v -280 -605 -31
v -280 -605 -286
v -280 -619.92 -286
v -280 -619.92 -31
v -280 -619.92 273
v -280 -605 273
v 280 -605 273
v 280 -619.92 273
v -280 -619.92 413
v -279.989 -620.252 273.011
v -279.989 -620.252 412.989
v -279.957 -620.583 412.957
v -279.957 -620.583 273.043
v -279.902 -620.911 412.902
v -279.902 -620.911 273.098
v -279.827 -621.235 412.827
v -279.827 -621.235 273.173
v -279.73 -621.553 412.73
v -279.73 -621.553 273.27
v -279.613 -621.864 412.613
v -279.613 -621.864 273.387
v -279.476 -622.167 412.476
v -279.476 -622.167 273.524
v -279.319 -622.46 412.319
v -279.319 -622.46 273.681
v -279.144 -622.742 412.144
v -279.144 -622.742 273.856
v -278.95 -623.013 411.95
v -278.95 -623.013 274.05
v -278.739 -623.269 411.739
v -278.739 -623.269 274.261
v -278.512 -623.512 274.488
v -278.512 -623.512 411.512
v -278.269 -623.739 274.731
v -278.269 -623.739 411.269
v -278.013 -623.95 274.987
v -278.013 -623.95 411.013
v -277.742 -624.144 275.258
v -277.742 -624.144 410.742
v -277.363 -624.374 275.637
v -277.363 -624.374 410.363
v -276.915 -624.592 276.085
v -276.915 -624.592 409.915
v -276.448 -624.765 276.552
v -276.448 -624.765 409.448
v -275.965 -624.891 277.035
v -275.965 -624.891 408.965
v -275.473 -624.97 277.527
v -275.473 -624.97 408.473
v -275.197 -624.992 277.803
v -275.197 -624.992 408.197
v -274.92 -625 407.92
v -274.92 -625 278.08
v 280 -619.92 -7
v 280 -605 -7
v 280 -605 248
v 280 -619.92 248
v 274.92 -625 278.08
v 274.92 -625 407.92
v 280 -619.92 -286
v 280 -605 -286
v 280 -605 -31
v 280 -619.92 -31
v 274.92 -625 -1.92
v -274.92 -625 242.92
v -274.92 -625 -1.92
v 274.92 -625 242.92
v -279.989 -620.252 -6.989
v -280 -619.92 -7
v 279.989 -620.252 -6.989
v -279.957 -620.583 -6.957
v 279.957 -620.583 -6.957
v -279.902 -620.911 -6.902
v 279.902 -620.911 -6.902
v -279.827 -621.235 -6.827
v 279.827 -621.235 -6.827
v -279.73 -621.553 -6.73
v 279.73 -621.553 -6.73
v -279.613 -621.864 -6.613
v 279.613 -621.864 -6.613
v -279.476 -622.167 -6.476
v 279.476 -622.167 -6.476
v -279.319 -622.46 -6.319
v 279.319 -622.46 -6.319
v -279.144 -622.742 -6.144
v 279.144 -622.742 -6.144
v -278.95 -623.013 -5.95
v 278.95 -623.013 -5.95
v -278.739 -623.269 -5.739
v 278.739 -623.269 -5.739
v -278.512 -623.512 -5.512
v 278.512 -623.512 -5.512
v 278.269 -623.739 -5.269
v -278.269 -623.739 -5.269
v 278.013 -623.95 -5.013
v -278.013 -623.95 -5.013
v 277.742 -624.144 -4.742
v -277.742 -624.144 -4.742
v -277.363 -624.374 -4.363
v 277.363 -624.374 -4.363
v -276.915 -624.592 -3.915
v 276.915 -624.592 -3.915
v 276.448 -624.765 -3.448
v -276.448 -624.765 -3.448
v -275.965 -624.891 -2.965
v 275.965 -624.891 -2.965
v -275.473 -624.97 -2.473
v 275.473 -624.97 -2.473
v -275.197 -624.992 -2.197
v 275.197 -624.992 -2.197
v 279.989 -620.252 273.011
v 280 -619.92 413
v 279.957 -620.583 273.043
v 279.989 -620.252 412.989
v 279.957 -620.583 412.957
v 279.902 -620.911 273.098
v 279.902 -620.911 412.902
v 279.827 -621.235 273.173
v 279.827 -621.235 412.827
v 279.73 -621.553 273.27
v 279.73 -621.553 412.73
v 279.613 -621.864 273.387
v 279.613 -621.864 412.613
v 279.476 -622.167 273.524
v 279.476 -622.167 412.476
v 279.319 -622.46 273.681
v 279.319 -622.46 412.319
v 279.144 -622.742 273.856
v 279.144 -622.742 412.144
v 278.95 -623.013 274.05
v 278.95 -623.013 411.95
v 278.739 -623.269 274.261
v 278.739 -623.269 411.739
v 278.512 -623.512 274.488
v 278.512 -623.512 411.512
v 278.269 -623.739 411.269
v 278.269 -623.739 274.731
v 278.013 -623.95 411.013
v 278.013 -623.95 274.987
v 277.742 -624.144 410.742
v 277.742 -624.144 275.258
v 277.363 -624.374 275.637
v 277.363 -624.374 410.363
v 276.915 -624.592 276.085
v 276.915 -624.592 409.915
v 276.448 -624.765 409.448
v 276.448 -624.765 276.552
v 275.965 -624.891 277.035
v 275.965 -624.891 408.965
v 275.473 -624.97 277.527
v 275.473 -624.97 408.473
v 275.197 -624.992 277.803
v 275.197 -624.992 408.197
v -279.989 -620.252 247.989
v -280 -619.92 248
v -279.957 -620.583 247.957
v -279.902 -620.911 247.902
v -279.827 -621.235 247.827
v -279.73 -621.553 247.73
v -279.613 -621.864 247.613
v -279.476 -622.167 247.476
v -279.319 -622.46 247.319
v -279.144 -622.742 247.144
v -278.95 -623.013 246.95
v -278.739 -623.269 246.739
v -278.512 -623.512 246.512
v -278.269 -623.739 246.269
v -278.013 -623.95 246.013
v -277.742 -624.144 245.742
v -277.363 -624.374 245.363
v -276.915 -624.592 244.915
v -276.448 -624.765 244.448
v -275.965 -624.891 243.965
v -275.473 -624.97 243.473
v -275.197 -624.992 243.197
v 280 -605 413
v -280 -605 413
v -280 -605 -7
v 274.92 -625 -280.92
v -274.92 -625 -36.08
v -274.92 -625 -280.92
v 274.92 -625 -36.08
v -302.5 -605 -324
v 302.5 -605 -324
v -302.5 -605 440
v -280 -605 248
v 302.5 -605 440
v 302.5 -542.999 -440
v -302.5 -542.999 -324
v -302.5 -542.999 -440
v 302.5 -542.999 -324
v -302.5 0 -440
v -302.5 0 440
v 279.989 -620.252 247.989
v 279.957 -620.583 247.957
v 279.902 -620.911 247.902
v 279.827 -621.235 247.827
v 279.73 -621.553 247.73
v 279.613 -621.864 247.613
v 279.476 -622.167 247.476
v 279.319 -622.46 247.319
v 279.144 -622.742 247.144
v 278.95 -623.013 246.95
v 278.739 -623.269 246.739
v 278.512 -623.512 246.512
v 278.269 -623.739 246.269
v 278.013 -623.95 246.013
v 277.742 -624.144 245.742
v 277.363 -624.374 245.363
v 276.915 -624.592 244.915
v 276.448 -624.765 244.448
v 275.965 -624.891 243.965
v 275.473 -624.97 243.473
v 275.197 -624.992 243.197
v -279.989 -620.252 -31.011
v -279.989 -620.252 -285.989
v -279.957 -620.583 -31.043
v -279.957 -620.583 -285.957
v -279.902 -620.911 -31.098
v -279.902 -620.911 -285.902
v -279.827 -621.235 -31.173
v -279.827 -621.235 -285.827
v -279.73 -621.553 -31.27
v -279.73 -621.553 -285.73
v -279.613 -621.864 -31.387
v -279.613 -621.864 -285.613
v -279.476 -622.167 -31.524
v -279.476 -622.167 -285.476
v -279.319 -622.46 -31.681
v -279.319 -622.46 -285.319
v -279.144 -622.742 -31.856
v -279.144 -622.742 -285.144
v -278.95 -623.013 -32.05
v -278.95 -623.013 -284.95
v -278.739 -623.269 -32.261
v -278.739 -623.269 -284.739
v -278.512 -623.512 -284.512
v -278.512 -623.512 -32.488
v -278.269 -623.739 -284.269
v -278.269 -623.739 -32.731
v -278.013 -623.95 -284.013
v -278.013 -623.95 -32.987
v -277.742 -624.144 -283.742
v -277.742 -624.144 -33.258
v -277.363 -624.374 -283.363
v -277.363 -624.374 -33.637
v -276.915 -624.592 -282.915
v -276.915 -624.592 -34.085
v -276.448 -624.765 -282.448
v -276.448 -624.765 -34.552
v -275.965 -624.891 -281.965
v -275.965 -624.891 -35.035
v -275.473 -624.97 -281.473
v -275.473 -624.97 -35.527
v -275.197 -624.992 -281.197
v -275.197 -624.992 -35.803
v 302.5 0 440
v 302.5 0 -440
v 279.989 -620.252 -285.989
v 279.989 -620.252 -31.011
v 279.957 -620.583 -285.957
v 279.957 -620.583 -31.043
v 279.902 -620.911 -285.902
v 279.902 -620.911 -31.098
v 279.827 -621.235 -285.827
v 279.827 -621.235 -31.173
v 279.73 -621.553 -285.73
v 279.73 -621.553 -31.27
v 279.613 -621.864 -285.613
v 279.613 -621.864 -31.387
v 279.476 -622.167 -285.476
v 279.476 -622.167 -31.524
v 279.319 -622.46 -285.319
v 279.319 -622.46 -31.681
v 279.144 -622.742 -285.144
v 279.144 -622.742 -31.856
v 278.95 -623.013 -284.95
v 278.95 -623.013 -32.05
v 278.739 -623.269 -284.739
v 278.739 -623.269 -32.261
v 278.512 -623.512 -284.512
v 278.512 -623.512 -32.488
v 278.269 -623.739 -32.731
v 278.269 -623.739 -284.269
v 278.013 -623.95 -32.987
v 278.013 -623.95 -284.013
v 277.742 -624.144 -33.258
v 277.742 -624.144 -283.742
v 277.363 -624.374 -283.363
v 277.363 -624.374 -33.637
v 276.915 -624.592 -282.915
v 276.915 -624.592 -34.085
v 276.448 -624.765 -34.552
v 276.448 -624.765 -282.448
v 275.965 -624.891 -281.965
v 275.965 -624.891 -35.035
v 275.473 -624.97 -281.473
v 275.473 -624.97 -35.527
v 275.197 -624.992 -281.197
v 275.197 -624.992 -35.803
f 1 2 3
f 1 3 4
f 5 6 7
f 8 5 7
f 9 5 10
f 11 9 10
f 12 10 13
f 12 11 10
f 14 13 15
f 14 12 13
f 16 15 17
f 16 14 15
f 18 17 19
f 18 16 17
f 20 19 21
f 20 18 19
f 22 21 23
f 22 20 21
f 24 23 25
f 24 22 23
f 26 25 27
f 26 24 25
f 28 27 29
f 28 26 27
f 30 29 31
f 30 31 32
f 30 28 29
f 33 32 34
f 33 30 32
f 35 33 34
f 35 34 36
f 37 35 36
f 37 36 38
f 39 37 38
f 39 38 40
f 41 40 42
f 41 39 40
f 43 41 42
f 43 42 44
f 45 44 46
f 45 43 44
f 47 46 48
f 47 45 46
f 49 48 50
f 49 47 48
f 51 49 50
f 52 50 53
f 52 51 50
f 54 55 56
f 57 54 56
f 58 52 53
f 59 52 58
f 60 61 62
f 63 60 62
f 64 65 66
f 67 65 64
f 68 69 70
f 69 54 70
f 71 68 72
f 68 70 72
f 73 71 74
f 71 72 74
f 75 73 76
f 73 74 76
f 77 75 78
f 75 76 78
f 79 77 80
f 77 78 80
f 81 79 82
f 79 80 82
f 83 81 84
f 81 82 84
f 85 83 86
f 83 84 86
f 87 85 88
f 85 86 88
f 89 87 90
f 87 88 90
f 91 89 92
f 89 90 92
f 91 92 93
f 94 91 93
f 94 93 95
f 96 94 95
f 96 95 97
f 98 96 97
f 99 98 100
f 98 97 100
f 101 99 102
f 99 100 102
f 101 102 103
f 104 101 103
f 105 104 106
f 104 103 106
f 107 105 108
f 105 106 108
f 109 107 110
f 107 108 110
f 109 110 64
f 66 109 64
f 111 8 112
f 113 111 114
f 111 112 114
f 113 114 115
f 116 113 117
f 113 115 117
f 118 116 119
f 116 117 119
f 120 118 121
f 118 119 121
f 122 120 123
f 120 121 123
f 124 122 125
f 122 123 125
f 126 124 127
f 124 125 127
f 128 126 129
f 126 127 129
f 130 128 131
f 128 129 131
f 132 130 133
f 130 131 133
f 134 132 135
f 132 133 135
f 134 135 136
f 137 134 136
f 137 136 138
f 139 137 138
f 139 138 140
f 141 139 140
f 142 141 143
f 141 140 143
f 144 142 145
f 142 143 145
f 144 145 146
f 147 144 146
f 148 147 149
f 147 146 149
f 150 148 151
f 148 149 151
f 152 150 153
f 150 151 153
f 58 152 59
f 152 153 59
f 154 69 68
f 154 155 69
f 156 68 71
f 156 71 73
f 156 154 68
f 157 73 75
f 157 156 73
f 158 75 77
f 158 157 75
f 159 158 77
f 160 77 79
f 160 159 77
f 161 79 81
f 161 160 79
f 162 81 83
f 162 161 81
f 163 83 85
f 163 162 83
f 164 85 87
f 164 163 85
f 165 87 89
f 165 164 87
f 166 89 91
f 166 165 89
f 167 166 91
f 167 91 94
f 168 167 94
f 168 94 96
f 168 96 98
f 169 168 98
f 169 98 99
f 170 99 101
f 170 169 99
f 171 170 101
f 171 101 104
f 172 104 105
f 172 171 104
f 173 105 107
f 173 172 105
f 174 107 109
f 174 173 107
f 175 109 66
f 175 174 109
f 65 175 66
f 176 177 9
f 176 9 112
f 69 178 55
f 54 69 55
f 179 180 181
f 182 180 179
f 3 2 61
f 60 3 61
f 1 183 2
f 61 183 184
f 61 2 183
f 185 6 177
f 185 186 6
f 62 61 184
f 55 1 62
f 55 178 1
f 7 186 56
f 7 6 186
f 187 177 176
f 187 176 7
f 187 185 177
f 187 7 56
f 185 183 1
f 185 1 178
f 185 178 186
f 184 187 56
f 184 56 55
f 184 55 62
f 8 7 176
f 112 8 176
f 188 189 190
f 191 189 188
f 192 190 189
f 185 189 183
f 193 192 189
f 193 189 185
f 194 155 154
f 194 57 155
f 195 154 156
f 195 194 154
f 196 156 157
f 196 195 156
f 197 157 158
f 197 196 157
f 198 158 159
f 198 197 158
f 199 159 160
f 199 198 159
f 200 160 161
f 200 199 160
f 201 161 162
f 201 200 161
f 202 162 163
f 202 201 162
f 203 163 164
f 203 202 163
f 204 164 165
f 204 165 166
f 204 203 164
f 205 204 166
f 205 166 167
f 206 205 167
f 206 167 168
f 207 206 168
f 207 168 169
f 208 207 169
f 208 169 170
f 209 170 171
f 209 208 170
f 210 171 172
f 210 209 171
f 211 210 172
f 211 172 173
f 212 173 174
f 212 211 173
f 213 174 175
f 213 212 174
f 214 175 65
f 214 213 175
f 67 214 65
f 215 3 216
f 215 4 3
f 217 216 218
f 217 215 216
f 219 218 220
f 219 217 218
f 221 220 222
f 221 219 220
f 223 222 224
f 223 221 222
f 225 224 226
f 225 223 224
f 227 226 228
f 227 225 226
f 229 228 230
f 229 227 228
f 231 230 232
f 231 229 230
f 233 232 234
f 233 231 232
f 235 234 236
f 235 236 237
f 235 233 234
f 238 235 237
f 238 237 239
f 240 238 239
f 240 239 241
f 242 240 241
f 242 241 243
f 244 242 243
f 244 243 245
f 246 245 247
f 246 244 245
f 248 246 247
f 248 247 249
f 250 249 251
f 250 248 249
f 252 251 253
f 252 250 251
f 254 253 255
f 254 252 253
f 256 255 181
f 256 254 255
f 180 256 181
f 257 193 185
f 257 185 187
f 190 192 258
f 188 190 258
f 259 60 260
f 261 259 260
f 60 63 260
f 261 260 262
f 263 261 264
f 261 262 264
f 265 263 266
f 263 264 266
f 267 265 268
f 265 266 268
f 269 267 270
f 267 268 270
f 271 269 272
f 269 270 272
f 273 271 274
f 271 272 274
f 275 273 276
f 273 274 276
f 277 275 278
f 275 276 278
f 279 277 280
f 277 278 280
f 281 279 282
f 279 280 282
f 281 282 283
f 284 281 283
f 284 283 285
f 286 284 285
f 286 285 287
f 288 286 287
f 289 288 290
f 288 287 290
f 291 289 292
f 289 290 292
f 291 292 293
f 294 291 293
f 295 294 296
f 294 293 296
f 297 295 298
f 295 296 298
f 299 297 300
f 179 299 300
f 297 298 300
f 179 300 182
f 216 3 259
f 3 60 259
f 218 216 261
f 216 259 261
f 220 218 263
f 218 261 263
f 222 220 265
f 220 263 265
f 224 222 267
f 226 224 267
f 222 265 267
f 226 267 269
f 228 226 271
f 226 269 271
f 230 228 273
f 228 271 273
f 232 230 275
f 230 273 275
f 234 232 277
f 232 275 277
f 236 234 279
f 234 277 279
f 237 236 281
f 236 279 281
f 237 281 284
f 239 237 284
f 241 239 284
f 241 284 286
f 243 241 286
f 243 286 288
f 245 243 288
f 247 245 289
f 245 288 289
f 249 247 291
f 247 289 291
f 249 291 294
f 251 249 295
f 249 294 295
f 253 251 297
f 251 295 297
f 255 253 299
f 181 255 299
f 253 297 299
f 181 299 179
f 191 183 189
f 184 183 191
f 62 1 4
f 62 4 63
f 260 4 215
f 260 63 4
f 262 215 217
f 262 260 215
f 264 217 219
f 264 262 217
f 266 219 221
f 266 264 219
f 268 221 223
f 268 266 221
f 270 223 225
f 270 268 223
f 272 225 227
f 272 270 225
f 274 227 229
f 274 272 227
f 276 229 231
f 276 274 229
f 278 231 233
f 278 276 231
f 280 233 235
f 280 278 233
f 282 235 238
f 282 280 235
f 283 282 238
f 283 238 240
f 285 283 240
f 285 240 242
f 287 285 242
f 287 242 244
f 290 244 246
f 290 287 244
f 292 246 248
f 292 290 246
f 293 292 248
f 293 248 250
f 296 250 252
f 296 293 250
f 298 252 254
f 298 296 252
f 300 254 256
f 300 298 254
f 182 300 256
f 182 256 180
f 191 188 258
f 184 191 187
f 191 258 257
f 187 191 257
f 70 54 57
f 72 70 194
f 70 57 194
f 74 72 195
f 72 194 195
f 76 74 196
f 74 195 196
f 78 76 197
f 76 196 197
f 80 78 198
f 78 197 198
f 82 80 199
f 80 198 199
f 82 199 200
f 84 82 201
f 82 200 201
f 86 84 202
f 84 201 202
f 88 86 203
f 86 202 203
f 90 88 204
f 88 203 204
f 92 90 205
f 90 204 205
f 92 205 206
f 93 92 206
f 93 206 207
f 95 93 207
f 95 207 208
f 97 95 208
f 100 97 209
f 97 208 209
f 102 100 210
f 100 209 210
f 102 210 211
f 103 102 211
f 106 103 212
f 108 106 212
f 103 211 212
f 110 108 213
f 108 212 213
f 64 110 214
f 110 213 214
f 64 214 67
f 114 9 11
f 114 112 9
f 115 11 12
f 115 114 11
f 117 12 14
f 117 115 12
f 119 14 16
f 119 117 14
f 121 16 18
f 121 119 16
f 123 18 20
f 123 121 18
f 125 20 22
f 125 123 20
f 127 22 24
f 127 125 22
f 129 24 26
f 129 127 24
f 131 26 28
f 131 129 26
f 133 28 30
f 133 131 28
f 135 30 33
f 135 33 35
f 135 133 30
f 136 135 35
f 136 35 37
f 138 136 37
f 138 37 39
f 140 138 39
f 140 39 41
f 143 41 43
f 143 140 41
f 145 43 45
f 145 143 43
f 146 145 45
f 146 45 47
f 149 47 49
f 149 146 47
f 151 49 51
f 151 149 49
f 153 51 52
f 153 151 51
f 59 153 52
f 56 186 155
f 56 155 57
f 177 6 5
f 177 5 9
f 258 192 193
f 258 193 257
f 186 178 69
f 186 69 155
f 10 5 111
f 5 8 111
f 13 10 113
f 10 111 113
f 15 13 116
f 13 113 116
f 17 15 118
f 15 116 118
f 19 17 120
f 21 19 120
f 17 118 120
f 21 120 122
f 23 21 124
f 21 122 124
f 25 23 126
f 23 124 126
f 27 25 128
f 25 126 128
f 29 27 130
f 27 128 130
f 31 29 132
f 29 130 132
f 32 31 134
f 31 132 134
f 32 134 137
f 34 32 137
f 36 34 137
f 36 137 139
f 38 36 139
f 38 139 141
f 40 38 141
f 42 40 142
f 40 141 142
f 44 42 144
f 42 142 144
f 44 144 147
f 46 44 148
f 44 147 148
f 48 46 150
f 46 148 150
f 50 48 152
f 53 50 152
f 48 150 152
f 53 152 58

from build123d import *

# Parameters (mm, degrees)
F0_W     = 605
F0_H     = 880
F1_DEPTH = 605
F2_W     = 605
F2_H     = 116
F3_DEPTH = 62.0014
F4_W     = 560
F4_H     = 140
F5_DEPTH = 20
F6_W     = 560
F6_H     = 255
F7_DEPTH = 20
F8_W     = 560
F8_H     = 255
F9_DEPTH = 20
F10_R    = 5.08


with BuildPart() as f1:
    # F0 (on Front) → F1 (new body)
    with BuildSketch(Plane.XZ):
        Rectangle(F0_W, F0_H)
    extrude(amount=F1_DEPTH)

    # F2 (on face) → F3 (cut)
    with BuildSketch(Plane.XZ.offset(605)):
        with Locations((0, -382)):
            Rectangle(F2_W, F2_H)
    extrude(amount=-F3_DEPTH, mode=Mode.SUBTRACT)

    # F4 (on face) → F5 (join)
    with BuildSketch(Plane.XZ.offset(605)):
        with Locations((0, 343)):
            Rectangle(F4_W, F4_H)
    extrude(amount=F5_DEPTH)

    # F6 (on face) → F7 (join)
    with BuildSketch(Plane.XZ.offset(605)):
        with Locations((0, 120.5)):
            Rectangle(F6_W, F6_H)
    extrude(amount=F7_DEPTH)

    # F8 (on face) → F9 (join)
    with BuildSketch(Plane.XZ.offset(605)):
        with Locations((0, -158.5)):
            Rectangle(F8_W, F8_H)
    extrude(amount=F9_DEPTH)

    # F10
    f10_edges = [f1.edges().sort_by_distance(p)[0] for p in [
        (0, -625, 413),
        (-280, -625, 343),
        (0, -625, 273),
        (280, -625, 343),
        (0, -625, 248),
        (280, -625, 120.5),
        (-280, -625, 120.5),
        (0, -625, -7),
        (0, -625, -31),
        (-280, -625, -158.5),
        (0, -625, -286),
        (280, -625, -158.5),
    ]]
    fillet(f10_edges, radius=F10_R)


solid = f1.part
